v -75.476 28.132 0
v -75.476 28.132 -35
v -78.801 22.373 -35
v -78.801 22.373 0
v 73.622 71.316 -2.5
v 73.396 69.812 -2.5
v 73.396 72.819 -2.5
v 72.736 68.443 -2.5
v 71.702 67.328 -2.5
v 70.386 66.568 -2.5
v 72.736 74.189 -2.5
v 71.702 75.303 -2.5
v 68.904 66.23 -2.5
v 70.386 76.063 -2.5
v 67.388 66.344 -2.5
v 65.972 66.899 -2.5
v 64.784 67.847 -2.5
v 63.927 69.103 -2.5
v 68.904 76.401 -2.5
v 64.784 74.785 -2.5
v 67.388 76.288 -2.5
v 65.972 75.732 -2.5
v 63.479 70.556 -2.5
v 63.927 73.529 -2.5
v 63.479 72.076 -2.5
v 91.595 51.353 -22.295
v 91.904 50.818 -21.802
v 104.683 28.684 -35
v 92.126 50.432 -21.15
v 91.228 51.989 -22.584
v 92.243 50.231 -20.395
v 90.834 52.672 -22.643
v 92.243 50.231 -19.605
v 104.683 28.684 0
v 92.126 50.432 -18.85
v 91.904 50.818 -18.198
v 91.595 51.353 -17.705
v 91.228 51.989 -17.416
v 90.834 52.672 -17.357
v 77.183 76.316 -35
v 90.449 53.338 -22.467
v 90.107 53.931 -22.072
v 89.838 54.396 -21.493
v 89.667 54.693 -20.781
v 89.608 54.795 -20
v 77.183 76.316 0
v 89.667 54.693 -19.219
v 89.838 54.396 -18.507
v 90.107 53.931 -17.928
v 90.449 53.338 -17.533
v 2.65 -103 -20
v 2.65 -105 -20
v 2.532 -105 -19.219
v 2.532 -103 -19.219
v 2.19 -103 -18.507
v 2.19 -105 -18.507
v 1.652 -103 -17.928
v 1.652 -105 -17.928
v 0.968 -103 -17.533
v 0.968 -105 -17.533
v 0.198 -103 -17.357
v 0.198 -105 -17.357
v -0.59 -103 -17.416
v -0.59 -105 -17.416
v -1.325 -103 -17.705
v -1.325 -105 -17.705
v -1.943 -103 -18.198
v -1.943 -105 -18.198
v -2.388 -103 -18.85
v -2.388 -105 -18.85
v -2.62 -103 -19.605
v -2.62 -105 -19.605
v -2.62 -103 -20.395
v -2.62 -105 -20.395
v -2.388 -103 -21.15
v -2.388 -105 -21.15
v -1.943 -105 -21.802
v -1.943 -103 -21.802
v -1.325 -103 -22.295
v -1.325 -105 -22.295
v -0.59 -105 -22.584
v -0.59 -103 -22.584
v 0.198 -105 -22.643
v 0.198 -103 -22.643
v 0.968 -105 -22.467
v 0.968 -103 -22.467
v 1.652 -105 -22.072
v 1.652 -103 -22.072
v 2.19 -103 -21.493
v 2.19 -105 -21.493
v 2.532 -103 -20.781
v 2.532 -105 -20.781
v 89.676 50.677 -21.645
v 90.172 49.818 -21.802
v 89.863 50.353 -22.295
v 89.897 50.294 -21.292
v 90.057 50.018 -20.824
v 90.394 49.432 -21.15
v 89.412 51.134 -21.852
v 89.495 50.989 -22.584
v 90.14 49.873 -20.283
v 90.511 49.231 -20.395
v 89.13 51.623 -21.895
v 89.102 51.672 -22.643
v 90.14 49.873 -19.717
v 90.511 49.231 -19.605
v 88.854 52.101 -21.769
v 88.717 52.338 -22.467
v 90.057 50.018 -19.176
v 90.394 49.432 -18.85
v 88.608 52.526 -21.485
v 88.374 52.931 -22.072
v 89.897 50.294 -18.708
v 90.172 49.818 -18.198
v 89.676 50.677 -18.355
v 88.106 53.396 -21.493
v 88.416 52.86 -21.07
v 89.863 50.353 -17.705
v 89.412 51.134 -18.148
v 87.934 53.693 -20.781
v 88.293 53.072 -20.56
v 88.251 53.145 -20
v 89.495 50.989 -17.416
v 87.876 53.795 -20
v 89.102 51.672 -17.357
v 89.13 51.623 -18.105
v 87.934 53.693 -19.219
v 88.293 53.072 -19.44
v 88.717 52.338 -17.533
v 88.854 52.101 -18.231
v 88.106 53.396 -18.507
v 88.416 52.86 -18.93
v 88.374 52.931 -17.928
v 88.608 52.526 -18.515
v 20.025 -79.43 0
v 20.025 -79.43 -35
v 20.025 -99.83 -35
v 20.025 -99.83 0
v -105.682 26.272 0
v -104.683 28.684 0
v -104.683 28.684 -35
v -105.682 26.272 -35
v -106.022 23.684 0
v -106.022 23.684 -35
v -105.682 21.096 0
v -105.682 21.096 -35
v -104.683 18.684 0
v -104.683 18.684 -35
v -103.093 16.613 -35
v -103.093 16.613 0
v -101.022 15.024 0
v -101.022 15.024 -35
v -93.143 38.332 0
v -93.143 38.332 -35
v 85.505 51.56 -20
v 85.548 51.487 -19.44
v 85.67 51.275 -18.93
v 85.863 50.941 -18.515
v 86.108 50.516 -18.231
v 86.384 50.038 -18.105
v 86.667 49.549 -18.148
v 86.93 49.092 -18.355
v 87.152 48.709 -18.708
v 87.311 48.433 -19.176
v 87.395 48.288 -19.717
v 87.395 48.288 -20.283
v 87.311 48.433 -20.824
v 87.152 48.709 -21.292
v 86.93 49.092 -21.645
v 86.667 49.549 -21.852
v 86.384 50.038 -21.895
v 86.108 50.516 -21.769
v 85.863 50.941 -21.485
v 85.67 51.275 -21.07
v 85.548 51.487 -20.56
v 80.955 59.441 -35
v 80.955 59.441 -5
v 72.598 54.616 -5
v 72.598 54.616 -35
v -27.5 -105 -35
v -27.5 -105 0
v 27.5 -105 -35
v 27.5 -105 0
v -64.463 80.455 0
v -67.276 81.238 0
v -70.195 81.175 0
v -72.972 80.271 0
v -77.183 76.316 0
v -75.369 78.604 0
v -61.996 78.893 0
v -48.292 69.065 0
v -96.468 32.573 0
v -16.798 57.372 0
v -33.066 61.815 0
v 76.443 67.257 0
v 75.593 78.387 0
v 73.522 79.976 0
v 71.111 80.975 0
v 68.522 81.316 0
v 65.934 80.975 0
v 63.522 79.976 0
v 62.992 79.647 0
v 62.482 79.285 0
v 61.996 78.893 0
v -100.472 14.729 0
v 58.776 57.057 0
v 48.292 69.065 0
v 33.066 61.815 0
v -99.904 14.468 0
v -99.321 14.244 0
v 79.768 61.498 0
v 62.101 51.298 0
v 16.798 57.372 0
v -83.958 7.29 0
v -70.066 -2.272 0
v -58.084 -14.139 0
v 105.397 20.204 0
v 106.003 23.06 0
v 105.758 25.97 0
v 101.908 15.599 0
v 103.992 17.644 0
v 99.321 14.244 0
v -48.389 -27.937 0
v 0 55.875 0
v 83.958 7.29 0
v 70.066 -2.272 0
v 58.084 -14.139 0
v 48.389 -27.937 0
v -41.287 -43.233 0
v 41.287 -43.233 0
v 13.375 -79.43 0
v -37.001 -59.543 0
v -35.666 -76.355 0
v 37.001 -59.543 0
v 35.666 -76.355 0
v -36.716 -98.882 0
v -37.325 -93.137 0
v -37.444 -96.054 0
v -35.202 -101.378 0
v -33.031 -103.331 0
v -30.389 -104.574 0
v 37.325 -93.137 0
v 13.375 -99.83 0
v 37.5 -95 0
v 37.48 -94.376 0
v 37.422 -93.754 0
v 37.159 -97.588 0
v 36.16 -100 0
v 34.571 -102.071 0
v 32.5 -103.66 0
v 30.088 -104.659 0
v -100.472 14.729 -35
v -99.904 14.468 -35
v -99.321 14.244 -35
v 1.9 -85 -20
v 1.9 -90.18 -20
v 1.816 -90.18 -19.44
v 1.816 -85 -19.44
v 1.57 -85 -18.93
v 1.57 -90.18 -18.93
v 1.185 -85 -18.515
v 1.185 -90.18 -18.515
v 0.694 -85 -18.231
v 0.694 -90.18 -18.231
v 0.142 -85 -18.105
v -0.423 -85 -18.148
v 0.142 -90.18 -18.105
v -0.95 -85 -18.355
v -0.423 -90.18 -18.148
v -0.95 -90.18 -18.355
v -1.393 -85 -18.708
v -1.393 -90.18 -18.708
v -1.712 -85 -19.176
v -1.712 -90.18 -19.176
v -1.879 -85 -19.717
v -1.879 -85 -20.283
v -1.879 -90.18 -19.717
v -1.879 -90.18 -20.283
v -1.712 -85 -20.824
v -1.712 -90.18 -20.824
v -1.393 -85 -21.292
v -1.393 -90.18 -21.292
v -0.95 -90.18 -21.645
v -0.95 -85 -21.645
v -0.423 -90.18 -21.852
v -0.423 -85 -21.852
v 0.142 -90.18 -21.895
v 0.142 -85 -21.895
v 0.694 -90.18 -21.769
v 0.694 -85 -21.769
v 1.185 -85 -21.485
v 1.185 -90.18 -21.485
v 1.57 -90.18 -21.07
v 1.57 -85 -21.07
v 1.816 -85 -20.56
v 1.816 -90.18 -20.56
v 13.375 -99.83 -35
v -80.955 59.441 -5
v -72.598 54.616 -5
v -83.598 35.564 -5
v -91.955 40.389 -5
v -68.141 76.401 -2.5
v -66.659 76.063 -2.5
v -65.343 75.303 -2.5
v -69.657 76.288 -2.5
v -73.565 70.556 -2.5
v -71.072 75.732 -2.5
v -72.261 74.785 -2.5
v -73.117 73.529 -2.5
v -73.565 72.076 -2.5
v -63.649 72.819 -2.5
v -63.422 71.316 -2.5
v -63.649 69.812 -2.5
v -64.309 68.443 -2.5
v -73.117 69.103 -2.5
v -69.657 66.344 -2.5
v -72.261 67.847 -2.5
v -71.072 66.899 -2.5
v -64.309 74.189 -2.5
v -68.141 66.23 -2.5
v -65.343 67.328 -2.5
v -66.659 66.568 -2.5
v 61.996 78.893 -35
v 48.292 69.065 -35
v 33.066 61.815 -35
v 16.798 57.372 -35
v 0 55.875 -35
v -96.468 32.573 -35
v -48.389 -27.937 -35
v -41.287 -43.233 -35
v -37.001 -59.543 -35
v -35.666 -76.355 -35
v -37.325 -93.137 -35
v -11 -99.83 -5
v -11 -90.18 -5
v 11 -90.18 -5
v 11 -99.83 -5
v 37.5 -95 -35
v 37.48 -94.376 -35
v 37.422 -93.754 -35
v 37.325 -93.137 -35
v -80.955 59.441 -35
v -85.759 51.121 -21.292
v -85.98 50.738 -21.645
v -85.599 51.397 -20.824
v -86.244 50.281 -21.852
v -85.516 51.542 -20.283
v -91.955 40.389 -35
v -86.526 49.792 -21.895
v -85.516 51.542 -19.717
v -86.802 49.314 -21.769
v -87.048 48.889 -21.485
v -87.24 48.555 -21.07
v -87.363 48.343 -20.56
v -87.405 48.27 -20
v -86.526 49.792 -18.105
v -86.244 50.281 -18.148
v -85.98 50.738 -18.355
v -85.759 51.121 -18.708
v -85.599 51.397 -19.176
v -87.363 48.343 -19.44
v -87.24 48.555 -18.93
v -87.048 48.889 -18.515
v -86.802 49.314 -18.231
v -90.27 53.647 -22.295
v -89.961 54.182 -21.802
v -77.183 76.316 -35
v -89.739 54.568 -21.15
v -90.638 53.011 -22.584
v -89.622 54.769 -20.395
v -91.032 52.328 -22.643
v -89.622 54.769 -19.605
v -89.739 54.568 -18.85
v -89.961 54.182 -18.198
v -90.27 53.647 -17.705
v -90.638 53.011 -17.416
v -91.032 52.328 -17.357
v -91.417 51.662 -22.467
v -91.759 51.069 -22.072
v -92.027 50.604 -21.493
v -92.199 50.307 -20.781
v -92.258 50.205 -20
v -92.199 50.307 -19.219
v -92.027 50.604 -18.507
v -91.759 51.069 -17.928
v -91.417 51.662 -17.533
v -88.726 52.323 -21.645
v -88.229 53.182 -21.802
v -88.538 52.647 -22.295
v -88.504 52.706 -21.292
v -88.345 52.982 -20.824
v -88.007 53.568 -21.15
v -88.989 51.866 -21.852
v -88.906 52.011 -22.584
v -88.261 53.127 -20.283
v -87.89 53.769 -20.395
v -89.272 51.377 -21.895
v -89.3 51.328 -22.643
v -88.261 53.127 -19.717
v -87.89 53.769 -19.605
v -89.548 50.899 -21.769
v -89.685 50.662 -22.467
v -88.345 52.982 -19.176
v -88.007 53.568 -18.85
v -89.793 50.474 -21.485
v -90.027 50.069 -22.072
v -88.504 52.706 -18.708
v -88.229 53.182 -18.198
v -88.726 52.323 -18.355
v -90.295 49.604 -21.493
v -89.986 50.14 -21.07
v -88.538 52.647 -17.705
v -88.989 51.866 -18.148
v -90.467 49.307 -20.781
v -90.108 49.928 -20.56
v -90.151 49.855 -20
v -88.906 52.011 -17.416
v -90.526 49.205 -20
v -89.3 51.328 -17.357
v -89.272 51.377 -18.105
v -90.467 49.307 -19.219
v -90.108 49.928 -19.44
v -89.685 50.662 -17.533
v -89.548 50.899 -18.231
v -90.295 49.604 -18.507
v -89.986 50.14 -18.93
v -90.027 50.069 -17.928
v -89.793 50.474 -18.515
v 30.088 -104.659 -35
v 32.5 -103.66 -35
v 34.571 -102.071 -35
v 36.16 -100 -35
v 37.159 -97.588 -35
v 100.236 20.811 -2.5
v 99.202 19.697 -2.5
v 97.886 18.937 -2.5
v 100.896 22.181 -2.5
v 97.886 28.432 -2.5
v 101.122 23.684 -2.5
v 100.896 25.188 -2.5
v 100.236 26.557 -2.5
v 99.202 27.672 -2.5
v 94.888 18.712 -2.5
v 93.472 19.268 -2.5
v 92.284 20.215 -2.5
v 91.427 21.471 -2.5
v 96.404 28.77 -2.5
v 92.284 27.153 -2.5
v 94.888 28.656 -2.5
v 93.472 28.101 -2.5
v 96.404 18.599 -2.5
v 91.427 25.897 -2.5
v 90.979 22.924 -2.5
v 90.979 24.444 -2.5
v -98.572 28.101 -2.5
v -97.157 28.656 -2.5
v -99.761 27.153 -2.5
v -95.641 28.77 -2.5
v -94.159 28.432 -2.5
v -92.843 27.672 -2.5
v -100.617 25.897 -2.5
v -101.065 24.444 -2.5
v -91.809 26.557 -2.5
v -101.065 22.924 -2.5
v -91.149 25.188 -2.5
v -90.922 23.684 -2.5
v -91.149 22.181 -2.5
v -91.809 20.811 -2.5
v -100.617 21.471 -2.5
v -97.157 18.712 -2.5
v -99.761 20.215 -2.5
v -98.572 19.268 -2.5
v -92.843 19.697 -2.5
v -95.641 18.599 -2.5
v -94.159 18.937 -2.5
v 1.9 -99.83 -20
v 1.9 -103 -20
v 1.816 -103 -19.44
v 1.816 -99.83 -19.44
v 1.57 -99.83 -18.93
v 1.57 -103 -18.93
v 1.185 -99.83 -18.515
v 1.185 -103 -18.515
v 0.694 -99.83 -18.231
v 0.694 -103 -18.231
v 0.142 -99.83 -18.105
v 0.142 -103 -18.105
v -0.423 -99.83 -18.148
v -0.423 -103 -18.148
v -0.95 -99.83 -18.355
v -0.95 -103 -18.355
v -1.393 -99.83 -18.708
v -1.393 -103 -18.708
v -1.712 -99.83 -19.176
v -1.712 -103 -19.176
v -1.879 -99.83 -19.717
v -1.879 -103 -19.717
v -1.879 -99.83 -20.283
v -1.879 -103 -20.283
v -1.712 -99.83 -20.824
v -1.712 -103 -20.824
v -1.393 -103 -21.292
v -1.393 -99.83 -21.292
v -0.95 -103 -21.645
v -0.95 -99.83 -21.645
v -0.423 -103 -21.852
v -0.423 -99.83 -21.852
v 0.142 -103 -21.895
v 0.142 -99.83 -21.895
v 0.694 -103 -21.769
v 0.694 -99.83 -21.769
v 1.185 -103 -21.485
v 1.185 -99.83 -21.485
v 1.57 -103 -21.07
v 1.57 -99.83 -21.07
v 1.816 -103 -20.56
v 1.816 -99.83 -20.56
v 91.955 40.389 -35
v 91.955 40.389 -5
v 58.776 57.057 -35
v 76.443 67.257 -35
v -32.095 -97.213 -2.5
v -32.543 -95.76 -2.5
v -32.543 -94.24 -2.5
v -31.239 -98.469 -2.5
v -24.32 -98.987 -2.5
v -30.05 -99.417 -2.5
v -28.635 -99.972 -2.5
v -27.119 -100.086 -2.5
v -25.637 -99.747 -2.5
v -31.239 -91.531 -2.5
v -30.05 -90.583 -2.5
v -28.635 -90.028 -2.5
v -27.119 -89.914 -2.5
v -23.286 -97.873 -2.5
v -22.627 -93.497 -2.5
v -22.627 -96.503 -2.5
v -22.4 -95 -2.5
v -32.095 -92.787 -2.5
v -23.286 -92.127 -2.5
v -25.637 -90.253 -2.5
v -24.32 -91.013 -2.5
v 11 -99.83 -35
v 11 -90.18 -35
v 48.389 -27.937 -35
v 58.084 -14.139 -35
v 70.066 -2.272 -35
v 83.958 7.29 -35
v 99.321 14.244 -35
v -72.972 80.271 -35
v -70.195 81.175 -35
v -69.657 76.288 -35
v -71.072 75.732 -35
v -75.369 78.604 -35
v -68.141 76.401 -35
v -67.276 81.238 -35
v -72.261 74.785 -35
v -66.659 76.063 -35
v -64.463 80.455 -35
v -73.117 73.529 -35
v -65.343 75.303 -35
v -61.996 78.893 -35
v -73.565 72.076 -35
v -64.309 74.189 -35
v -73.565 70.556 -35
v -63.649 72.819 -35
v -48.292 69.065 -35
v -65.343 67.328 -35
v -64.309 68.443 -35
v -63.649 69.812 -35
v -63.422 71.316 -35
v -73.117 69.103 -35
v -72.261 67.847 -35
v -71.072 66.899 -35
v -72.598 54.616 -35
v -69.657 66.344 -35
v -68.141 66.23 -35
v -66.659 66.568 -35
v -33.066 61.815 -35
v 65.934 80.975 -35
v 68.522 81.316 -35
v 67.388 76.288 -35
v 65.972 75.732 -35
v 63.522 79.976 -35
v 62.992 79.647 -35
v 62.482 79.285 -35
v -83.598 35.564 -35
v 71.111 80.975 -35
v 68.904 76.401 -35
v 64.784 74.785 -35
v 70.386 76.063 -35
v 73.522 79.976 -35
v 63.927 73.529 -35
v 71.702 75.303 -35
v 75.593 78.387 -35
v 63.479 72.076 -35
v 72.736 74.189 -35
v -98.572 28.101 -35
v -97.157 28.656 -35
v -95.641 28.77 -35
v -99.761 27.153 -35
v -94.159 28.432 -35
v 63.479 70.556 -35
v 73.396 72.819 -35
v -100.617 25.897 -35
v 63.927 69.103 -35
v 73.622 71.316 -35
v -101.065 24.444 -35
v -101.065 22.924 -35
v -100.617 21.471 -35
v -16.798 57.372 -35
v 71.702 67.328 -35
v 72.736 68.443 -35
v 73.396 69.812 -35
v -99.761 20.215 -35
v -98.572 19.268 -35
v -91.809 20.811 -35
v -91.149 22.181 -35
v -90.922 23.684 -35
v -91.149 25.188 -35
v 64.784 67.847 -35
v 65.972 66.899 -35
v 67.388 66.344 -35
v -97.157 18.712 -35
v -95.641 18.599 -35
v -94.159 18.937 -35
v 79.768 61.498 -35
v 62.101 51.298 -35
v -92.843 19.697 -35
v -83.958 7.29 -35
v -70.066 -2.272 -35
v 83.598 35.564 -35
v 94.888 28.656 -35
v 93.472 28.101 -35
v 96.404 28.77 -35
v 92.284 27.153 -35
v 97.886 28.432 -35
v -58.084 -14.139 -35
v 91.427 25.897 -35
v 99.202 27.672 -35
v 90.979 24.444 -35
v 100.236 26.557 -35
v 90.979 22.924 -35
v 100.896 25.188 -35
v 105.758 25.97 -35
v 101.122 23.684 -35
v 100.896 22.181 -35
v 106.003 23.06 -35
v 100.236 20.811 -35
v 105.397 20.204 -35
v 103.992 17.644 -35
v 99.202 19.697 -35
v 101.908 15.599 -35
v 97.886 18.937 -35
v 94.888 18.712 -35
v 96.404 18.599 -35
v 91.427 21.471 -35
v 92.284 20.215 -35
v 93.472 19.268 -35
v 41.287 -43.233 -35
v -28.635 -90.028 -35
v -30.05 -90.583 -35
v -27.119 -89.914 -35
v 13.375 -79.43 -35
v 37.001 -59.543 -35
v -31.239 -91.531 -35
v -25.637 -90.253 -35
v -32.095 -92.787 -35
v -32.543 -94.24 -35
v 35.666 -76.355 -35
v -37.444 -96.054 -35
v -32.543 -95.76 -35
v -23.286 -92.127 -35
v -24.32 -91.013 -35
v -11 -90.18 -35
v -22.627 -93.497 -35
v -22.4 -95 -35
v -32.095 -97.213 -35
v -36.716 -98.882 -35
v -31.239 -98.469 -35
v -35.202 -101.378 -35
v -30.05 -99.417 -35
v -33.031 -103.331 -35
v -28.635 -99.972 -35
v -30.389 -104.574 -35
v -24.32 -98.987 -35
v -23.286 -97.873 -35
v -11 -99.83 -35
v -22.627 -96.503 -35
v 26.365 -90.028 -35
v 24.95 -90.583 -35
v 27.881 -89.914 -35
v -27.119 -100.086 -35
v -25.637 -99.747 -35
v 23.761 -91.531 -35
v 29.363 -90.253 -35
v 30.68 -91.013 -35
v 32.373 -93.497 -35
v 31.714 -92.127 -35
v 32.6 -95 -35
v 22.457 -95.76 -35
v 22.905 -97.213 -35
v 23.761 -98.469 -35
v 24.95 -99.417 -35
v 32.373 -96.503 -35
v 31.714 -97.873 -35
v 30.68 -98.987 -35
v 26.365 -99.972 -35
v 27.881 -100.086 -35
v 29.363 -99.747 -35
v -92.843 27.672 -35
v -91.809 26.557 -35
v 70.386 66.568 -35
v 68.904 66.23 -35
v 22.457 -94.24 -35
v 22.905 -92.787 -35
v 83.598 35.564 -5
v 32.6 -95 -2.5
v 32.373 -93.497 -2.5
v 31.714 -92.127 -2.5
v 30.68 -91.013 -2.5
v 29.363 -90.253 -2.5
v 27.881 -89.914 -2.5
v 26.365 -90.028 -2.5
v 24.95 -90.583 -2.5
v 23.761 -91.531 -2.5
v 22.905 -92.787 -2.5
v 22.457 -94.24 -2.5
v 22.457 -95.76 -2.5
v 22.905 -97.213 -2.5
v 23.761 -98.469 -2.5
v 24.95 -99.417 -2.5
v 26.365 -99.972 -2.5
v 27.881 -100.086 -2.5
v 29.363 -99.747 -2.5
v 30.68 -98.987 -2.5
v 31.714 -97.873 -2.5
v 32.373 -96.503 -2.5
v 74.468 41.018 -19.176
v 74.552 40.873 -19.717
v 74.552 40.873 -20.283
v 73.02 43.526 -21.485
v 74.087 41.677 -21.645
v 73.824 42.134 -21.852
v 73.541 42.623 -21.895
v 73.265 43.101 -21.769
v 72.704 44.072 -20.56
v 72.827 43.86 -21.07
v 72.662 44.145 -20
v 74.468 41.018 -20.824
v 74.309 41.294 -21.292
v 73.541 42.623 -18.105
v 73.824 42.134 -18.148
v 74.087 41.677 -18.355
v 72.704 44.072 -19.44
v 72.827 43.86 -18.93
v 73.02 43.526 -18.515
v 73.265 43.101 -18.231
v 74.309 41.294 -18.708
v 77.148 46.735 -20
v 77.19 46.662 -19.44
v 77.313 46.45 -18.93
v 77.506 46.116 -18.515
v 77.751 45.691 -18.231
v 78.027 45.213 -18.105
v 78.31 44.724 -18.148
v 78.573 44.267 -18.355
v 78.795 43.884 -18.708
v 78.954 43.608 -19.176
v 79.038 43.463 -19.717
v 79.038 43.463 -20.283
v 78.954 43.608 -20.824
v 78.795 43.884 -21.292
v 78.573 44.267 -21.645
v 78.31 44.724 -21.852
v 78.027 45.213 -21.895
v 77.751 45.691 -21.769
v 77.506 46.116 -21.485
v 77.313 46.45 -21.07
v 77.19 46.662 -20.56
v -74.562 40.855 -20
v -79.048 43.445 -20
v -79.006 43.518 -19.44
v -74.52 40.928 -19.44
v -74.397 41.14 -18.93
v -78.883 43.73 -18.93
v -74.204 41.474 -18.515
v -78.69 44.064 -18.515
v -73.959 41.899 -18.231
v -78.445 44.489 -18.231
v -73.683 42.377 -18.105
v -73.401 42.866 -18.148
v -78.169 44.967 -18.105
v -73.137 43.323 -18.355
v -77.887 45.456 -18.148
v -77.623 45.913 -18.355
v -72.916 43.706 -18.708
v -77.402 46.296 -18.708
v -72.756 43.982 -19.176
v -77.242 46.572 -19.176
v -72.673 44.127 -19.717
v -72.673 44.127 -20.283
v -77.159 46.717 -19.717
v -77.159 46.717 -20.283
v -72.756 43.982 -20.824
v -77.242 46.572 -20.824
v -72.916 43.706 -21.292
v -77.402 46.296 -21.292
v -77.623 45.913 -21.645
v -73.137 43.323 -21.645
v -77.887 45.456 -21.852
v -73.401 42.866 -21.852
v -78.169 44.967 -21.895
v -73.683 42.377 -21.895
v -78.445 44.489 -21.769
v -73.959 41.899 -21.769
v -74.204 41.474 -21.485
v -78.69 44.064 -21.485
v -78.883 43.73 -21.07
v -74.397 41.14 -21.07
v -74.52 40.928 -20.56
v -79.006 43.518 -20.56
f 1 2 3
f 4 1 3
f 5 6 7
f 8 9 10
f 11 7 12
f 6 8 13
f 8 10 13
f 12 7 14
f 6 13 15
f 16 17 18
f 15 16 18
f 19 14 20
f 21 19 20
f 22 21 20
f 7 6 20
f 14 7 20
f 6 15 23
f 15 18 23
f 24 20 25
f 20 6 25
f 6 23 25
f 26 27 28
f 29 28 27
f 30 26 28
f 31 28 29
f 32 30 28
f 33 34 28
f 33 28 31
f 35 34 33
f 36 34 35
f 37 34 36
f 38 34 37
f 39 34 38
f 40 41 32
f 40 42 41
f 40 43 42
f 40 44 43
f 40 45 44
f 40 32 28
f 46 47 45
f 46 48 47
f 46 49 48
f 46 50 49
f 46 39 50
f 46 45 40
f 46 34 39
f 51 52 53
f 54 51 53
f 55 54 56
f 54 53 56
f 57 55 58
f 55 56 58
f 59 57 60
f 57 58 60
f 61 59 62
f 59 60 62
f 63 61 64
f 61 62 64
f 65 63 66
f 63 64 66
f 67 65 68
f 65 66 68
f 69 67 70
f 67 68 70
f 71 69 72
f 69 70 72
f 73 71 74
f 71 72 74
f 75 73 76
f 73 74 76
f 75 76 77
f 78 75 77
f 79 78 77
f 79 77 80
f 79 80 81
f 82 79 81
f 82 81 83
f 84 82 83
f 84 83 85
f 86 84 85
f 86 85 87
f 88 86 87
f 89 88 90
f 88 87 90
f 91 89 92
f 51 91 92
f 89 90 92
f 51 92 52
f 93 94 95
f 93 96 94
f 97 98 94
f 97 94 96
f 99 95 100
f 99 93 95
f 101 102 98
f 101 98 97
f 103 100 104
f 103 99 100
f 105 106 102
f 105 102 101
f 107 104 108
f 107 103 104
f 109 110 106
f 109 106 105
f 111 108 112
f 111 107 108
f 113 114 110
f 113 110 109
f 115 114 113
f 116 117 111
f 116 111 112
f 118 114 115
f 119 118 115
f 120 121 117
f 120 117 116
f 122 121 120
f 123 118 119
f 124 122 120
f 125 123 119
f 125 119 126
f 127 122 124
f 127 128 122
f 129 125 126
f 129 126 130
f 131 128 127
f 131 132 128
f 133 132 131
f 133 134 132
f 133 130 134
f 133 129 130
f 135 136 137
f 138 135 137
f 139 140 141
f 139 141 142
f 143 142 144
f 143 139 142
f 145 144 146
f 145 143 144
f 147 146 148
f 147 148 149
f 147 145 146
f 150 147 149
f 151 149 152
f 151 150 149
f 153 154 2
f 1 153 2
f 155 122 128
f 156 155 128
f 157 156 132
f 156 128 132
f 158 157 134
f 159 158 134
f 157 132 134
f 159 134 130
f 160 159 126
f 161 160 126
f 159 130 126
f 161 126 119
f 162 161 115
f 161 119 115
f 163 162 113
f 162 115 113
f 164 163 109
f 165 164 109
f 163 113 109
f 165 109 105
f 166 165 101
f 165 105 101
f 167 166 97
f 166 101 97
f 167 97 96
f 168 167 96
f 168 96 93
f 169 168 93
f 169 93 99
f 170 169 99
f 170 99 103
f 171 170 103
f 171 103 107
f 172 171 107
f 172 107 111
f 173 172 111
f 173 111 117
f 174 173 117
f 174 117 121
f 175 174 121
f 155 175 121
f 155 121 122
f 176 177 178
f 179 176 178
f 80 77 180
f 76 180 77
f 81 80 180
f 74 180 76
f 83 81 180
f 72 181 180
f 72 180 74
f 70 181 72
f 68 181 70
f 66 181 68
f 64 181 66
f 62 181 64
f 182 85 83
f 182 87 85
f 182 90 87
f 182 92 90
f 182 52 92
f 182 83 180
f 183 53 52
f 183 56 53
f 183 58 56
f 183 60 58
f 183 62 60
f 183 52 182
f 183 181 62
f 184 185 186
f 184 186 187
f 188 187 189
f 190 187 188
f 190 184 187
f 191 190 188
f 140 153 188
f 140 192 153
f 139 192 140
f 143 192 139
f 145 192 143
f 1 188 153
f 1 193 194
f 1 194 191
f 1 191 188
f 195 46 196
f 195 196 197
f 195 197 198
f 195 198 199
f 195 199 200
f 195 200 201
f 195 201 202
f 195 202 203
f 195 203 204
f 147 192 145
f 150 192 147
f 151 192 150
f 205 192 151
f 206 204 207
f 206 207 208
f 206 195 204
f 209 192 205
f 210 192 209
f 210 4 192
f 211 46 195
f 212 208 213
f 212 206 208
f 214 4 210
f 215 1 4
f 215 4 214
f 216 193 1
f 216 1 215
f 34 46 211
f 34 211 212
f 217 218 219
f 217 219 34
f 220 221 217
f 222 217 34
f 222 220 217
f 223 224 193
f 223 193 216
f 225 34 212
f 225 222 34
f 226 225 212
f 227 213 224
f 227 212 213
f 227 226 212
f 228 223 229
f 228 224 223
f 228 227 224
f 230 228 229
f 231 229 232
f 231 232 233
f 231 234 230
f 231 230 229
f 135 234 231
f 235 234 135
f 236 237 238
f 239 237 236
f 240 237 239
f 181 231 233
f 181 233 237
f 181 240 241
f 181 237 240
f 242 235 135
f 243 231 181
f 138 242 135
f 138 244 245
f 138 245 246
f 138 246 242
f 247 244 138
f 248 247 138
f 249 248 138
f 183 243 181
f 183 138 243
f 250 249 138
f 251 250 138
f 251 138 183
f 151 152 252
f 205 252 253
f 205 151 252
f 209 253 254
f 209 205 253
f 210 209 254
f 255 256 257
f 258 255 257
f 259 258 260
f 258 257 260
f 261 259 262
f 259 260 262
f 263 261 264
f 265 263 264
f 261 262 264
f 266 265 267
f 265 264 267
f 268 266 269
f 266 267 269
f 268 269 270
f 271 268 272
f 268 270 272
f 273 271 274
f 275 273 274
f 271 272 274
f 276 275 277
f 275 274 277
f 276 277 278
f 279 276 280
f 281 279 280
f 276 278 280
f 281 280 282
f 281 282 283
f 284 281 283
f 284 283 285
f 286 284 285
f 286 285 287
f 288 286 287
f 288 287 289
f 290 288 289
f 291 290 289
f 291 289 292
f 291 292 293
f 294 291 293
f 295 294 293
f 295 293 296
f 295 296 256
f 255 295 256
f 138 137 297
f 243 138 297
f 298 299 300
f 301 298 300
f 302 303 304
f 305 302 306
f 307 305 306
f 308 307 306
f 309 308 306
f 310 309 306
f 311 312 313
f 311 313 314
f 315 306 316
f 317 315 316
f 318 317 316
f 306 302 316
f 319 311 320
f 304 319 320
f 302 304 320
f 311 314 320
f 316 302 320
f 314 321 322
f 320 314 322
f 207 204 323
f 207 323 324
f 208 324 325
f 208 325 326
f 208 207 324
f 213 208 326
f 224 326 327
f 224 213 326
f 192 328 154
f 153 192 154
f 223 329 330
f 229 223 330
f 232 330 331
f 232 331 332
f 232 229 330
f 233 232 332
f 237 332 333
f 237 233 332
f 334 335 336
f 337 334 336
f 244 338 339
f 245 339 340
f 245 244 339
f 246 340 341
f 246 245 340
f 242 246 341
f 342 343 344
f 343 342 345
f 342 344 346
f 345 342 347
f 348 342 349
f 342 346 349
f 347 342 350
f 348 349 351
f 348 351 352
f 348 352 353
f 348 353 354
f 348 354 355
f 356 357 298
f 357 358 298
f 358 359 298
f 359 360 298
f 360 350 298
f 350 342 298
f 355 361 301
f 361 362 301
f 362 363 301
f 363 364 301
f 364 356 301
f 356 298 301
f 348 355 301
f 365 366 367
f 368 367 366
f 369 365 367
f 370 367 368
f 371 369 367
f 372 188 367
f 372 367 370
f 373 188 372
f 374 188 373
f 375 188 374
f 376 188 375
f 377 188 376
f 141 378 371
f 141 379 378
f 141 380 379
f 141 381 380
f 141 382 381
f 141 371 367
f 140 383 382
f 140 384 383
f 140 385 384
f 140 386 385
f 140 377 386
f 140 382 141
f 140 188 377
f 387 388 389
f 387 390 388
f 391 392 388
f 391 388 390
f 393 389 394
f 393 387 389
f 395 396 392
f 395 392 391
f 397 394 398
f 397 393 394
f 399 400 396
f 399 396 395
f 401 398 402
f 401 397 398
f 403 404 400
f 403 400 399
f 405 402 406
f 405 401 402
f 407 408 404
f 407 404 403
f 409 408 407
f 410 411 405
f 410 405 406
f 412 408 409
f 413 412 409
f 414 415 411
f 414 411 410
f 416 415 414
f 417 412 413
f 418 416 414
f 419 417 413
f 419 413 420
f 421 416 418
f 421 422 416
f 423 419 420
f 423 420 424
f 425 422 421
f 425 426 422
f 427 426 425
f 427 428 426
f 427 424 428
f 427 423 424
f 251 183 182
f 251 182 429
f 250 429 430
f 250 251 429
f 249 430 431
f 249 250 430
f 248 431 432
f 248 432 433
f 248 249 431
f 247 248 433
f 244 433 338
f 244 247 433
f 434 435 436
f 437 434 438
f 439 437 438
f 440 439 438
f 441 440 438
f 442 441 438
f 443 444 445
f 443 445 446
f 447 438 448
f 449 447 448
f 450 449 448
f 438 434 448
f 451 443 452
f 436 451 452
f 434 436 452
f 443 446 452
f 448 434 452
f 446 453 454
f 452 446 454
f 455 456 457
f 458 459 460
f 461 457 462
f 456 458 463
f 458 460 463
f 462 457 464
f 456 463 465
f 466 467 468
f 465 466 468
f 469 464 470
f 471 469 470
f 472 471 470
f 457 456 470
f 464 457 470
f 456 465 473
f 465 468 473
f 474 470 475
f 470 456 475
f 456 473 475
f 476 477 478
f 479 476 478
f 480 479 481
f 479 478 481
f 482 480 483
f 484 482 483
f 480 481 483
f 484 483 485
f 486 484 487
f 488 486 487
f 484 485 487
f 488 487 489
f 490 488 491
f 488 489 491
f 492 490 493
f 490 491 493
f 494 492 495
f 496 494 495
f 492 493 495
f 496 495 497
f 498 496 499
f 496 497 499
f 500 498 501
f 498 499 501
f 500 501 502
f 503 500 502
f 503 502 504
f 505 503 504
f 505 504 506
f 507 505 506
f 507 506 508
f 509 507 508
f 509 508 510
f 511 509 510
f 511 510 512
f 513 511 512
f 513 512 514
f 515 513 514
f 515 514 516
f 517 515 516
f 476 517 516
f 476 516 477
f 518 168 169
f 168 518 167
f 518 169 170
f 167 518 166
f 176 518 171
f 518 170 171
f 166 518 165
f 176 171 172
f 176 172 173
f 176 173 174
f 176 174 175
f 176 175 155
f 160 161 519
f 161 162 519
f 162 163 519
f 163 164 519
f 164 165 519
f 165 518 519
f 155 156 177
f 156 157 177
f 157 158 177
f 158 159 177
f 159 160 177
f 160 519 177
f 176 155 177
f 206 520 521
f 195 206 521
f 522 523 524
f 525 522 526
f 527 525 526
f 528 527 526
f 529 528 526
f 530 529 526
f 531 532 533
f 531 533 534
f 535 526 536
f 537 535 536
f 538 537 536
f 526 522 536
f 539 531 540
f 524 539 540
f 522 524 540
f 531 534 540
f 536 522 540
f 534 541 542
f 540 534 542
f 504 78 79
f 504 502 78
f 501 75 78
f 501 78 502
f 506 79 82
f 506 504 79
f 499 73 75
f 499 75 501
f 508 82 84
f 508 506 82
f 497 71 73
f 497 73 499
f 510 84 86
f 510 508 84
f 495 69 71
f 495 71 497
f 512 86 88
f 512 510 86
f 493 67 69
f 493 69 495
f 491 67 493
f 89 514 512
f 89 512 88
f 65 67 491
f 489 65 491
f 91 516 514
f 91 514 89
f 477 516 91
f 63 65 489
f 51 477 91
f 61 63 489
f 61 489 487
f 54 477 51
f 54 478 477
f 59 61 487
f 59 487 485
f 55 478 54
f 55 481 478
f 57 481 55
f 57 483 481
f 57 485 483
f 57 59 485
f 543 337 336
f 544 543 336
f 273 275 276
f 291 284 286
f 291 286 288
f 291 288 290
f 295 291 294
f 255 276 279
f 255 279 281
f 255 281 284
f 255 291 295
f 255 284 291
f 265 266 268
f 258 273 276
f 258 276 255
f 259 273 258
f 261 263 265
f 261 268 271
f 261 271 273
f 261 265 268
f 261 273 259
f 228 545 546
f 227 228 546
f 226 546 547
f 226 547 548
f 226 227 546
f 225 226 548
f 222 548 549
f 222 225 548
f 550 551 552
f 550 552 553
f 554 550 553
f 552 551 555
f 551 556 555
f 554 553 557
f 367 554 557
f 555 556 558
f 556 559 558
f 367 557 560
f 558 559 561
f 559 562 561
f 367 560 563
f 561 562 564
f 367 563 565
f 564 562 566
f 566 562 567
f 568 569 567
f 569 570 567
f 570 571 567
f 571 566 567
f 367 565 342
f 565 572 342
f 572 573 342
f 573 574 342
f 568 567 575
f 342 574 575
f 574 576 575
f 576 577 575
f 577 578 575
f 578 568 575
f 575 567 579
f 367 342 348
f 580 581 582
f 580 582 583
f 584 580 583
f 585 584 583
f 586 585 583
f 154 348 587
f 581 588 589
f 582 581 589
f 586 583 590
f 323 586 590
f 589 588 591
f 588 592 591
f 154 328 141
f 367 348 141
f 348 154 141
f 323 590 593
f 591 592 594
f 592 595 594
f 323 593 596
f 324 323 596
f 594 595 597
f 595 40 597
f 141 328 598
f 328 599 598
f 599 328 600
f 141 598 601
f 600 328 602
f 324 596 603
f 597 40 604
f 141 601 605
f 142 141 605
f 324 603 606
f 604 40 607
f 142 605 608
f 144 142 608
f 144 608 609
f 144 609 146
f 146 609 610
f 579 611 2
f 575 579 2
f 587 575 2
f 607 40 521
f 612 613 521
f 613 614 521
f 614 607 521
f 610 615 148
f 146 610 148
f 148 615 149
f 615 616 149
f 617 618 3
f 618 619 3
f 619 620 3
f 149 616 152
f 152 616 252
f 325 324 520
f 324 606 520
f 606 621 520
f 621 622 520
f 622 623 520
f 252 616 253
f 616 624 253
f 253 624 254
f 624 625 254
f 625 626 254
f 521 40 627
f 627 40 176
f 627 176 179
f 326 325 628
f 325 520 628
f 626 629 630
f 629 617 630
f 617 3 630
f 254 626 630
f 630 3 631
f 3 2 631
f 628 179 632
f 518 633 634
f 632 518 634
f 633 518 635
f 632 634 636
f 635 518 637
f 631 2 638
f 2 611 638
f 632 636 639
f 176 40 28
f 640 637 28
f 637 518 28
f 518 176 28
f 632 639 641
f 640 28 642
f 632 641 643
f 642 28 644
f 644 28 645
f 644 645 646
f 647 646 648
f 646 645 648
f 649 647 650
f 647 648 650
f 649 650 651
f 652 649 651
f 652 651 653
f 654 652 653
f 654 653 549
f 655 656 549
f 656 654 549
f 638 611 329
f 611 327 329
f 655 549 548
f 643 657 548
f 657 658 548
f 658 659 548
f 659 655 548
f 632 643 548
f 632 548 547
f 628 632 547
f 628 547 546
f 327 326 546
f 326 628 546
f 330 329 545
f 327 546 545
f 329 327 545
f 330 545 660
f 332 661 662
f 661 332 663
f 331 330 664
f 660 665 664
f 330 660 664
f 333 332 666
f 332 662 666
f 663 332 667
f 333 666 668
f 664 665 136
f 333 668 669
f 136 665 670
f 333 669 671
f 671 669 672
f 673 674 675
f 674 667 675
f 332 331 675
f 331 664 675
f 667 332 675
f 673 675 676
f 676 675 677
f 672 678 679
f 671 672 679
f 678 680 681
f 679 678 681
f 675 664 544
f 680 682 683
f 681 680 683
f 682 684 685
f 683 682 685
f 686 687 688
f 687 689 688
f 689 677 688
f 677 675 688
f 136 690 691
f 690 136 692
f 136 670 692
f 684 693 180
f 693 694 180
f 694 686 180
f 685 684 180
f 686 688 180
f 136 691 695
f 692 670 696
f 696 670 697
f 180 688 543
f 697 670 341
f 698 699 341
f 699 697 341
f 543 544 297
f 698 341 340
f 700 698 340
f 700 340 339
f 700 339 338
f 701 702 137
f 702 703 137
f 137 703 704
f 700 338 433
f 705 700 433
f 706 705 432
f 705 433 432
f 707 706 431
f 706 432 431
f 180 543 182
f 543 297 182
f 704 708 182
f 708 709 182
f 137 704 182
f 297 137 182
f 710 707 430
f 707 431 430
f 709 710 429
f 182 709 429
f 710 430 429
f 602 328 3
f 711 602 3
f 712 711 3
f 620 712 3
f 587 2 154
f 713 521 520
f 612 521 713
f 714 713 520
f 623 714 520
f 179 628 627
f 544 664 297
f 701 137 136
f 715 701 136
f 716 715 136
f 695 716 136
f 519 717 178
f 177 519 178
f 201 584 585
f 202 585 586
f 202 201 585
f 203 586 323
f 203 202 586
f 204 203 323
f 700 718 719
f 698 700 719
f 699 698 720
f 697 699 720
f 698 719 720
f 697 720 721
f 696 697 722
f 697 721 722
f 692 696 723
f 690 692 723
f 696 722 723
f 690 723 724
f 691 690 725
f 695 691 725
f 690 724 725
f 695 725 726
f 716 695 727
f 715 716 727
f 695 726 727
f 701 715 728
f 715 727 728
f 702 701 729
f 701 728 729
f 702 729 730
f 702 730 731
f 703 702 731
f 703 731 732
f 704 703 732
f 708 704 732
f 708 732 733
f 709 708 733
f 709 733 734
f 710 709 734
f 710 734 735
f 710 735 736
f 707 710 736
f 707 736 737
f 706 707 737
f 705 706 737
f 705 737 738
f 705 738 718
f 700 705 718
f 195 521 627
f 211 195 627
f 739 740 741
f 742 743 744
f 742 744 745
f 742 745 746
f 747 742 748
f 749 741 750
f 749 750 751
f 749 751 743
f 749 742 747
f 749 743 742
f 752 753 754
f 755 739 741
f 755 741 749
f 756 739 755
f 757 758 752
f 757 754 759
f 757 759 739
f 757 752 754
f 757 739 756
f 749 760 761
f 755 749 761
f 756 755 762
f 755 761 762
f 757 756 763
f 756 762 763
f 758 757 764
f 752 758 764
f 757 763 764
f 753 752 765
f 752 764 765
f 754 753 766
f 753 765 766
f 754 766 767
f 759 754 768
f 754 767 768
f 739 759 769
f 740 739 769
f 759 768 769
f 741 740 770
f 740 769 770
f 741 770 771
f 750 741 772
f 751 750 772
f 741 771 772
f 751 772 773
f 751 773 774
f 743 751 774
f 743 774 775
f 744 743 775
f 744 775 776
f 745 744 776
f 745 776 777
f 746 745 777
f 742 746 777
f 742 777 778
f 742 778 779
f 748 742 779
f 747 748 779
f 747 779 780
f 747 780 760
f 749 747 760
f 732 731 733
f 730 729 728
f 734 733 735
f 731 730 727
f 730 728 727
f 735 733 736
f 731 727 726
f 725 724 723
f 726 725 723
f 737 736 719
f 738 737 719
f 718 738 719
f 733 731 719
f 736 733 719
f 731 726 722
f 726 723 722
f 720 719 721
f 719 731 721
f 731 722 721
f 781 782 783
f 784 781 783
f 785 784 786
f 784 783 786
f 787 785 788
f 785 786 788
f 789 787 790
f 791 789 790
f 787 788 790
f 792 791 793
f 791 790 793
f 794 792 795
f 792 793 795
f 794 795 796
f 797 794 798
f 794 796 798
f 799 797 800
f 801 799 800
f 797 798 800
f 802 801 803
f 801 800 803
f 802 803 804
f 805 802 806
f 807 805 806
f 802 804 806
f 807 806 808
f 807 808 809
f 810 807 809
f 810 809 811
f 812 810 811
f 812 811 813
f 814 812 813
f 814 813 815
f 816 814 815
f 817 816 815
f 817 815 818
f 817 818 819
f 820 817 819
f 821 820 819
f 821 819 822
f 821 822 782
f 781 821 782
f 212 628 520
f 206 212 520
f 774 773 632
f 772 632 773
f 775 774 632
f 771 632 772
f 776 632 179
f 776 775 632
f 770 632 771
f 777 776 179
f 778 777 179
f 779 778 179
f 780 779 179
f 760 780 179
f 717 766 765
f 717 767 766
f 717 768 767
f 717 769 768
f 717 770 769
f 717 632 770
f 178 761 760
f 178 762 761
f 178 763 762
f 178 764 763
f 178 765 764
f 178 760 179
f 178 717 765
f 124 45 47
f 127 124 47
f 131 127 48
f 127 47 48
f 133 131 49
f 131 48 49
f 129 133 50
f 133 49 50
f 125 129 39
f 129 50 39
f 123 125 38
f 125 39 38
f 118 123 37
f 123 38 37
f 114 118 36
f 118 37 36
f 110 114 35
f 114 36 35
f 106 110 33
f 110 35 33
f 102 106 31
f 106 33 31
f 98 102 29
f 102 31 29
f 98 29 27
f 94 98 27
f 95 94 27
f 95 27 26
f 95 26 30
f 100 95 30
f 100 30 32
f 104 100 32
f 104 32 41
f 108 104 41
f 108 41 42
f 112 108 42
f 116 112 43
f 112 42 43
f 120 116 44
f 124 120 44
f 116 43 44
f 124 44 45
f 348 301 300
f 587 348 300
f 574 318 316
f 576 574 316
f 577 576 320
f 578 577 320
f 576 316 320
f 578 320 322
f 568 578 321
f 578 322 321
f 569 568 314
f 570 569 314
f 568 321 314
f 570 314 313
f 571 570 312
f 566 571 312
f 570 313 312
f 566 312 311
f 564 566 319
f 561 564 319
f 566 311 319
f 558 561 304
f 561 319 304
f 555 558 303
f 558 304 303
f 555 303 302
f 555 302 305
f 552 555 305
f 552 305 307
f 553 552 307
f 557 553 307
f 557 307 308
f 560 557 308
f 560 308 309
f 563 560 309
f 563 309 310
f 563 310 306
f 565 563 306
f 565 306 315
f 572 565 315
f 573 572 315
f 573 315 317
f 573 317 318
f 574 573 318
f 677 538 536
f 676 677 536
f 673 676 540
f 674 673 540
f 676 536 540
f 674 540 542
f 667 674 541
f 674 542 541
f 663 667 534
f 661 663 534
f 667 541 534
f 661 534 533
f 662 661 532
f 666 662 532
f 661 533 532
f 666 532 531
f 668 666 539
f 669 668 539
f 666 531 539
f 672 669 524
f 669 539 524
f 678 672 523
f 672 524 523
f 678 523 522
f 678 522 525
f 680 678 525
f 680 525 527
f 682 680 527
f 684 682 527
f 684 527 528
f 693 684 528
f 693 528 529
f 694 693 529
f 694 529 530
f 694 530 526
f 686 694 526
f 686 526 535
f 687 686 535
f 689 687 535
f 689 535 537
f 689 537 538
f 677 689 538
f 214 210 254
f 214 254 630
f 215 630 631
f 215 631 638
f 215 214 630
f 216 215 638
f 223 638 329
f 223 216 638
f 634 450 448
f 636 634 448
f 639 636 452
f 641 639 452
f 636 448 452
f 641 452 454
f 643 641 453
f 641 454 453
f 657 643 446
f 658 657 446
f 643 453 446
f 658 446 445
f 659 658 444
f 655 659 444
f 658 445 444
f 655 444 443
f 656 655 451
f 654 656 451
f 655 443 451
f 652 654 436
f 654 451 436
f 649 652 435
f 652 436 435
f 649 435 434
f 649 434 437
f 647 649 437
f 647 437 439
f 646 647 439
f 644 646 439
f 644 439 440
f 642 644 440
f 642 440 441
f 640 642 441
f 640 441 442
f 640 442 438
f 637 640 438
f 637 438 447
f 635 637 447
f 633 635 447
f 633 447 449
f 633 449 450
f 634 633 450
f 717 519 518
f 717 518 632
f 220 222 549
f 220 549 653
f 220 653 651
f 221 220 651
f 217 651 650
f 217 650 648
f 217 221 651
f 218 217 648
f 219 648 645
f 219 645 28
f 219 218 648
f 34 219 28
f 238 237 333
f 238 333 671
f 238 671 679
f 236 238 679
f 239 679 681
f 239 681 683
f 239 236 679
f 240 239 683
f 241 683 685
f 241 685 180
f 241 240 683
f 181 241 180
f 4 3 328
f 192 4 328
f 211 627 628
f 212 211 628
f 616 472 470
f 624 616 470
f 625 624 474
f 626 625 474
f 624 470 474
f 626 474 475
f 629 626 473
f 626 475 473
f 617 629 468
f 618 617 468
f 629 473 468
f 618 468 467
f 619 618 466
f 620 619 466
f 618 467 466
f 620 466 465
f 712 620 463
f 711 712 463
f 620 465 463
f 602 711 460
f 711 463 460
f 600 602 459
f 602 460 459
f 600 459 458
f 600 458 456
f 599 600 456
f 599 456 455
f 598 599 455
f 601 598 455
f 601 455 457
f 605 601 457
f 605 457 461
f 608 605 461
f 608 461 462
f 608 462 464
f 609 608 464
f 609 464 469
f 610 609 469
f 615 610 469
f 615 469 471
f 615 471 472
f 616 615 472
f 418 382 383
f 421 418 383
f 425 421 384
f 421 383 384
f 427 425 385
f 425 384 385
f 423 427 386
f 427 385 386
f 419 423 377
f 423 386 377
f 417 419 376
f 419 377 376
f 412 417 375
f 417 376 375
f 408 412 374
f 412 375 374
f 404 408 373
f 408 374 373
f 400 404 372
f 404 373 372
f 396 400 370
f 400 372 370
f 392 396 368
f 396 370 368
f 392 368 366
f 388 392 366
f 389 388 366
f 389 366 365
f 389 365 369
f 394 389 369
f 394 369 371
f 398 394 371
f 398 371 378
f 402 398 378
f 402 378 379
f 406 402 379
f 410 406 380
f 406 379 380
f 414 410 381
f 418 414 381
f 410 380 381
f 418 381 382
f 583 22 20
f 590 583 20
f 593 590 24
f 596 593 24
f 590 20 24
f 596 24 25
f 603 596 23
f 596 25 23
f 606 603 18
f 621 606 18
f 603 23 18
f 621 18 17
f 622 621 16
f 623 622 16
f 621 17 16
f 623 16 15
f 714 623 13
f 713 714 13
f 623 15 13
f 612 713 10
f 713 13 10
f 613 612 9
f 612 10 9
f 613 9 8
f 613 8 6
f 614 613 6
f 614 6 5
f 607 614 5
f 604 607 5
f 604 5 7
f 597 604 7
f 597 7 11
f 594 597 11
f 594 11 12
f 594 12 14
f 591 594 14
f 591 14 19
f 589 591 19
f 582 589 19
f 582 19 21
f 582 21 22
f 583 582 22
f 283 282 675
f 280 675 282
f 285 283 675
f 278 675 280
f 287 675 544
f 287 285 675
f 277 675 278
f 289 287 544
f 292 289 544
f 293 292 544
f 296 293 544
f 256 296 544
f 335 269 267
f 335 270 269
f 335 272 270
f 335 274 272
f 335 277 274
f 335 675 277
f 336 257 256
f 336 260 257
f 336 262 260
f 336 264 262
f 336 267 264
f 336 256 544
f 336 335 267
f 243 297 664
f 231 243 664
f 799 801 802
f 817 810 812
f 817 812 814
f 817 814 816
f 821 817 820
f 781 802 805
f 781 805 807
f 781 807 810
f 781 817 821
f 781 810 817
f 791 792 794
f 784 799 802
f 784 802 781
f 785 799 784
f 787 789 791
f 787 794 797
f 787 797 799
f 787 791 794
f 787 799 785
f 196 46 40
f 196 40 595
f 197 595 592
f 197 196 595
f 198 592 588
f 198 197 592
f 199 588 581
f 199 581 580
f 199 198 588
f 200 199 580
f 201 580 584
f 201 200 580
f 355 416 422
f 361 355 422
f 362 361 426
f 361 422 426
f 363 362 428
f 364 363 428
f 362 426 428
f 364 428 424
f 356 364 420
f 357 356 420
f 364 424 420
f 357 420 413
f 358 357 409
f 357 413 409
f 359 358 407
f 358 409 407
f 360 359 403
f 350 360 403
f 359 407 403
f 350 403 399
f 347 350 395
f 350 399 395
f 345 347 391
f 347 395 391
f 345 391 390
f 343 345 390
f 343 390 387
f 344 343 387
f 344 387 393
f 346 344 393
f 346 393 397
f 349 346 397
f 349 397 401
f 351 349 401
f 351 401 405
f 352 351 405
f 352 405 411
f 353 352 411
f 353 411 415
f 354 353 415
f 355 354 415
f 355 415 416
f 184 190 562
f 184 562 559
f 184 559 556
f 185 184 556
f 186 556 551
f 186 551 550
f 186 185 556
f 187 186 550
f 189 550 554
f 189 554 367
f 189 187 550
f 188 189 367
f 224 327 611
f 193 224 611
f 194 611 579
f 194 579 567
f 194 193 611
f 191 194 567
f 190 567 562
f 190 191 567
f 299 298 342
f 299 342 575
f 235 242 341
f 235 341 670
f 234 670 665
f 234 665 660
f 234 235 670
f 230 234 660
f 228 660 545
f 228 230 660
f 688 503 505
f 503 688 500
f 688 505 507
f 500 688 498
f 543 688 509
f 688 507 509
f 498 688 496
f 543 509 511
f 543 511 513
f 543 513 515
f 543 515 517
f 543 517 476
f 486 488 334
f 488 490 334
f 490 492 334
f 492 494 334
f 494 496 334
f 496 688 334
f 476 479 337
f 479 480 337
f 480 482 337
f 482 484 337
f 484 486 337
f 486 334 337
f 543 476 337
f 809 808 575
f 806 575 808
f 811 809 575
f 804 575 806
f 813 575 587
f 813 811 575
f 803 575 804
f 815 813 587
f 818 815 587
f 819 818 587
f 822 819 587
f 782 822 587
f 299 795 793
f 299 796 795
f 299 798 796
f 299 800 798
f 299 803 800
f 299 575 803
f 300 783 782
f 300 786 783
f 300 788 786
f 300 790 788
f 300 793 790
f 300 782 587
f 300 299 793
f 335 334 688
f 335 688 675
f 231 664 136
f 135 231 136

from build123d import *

# Parameters (mm, degrees)
F0_R      = 5.1
F1_DEPTH  = 35
F2_W      = 22
F2_H      = 9.65
F3_DEPTH  = 35
F4_DEPTH  = 5
F5_DEPTH  = 2.5
F6_R      = 1.9
F7_DEPTH  = 20
F6_R_2    = 2.65
F8_DEPTH  = 2
F10_DEPTH = 35
F11_COUNT = 3


with BuildPart() as f1:
    # F0 (on Top) → F1 (new body)
    with BuildSketch(Plane.XY):
        with BuildLine():
            Line((48.3891499996, -27.9374887781), (0, 0))
            Line((0, 0), (-48.3891499996, -27.9374887781))
            ThreePointArc((-48.3891499996, -27.9374887781), (-37.0005953155, -59.5433683199), (-37.3249107961, -93.1369036932))
            ThreePointArc((-37.3249107961, -93.1369036932), (-26.5643472762, -85.0438685233), (-17.5, -95))
            ThreePointArc((-17.5, -95), (-20.4289321881, -102.0710678119), (-27.5, -105))
            Line((-27.5, -105), (27.5, -105))
            ThreePointArc((27.5, -105), (19.7983455327, -88.6215583043), (37.3249107961, -93.1369036932))
            ThreePointArc((37.3249107961, -93.1369036932), (37.0005953155, -59.5433683199), (48.3891499996, -27.9374887781))
        make_face()
        with BuildLine():
            ThreePointArc((37.5, -95), (37.4561314767, -94.0643472762), (37.3249107961, -93.1369036932))
            ThreePointArc((37.3249107961, -93.1369036932), (19.7983455327, -88.6215583043), (27.5, -105))
            ThreePointArc((27.5, -105), (34.5710678119, -102.0710678119), (37.5, -95))
        make_face()
        with Locations((27.5, -95)):
            Circle(F0_R, mode=Mode.SUBTRACT)
        with BuildLine():
            ThreePointArc((-17.5, -95), (-26.5643472762, -85.0438685233), (-37.3249107961, -93.1369036932))
            ThreePointArc((-37.3249107961, -93.1369036932), (-35.2016544673, -101.3784416957), (-27.5, -105))
            ThreePointArc((-27.5, -105), (-20.4289321881, -102.0710678119), (-17.5, -95))
        make_face()
        with Locations((-27.5, -95)):
            Circle(F0_R, mode=Mode.SUBTRACT)
    extrude(amount=-F1_DEPTH)

    # F2 (on face) → F3 (cut, through all)
    with BuildSketch(Plane.XY):
        with Locations((0, -95.005)):
            Rectangle(F2_W, F2_H)
    extrude(amount=-F3_DEPTH, mode=Mode.SUBTRACT)

    # F2 (on face) → F4 (join)
    with BuildSketch(Plane.XY):
        with Locations((0, -95.005)):
            Rectangle(F2_W, F2_H)
    extrude(amount=-F4_DEPTH)

    # F0 (on Top) → F5 (join)
    with BuildSketch(Plane.XY):
        with Locations((27.5, -95)):
            Circle(F0_R)
        with Locations((-27.5, -95)):
            Circle(F0_R)
    extrude(amount=-F5_DEPTH)

    # F6 (on face) → F7 (cut)
    with BuildSketch(Plane.XZ.offset(105)):
        with Locations((0, -20)):
            Circle(F6_R)
    extrude(amount=-F7_DEPTH, mode=Mode.SUBTRACT)

    # F6 (on face) → F8 (cut)
    with BuildSketch(Plane.XZ.offset(105)):
        with Locations((0, -20)):
            Circle(F6_R_2)
        with Locations((0, -20)):
            Circle(F6_R, mode=Mode.SUBTRACT)
    extrude(amount=-F8_DEPTH, mode=Mode.SUBTRACT)

    # F9 (on face) → F10 (cut, through all)
    with BuildSketch(Plane(origin=(0, 0, -35), x_dir=(1, 0, 0), z_dir=(0, 0, -1))):
        Polygon((20.0250012255, 95.005), (20.0250012255, 99.83), (13.3750012255, 99.83), (13.3750012255, 95.005), (13.3750012255, 79.43), (20.0250012255, 79.43), align=None)
    extrude(amount=-F10_DEPTH, mode=Mode.SUBTRACT)

    # F11: F1 ×3 about axis
    f11_axis = Axis((0, 0, 0), (0, 0, 1))


with BuildPart() as f1_1:
    add(f1.part)
    for i in range(1, F11_COUNT):
        add(f1.part.rotate(f11_axis, i * 360 / F11_COUNT))


solid = f1_1.part
